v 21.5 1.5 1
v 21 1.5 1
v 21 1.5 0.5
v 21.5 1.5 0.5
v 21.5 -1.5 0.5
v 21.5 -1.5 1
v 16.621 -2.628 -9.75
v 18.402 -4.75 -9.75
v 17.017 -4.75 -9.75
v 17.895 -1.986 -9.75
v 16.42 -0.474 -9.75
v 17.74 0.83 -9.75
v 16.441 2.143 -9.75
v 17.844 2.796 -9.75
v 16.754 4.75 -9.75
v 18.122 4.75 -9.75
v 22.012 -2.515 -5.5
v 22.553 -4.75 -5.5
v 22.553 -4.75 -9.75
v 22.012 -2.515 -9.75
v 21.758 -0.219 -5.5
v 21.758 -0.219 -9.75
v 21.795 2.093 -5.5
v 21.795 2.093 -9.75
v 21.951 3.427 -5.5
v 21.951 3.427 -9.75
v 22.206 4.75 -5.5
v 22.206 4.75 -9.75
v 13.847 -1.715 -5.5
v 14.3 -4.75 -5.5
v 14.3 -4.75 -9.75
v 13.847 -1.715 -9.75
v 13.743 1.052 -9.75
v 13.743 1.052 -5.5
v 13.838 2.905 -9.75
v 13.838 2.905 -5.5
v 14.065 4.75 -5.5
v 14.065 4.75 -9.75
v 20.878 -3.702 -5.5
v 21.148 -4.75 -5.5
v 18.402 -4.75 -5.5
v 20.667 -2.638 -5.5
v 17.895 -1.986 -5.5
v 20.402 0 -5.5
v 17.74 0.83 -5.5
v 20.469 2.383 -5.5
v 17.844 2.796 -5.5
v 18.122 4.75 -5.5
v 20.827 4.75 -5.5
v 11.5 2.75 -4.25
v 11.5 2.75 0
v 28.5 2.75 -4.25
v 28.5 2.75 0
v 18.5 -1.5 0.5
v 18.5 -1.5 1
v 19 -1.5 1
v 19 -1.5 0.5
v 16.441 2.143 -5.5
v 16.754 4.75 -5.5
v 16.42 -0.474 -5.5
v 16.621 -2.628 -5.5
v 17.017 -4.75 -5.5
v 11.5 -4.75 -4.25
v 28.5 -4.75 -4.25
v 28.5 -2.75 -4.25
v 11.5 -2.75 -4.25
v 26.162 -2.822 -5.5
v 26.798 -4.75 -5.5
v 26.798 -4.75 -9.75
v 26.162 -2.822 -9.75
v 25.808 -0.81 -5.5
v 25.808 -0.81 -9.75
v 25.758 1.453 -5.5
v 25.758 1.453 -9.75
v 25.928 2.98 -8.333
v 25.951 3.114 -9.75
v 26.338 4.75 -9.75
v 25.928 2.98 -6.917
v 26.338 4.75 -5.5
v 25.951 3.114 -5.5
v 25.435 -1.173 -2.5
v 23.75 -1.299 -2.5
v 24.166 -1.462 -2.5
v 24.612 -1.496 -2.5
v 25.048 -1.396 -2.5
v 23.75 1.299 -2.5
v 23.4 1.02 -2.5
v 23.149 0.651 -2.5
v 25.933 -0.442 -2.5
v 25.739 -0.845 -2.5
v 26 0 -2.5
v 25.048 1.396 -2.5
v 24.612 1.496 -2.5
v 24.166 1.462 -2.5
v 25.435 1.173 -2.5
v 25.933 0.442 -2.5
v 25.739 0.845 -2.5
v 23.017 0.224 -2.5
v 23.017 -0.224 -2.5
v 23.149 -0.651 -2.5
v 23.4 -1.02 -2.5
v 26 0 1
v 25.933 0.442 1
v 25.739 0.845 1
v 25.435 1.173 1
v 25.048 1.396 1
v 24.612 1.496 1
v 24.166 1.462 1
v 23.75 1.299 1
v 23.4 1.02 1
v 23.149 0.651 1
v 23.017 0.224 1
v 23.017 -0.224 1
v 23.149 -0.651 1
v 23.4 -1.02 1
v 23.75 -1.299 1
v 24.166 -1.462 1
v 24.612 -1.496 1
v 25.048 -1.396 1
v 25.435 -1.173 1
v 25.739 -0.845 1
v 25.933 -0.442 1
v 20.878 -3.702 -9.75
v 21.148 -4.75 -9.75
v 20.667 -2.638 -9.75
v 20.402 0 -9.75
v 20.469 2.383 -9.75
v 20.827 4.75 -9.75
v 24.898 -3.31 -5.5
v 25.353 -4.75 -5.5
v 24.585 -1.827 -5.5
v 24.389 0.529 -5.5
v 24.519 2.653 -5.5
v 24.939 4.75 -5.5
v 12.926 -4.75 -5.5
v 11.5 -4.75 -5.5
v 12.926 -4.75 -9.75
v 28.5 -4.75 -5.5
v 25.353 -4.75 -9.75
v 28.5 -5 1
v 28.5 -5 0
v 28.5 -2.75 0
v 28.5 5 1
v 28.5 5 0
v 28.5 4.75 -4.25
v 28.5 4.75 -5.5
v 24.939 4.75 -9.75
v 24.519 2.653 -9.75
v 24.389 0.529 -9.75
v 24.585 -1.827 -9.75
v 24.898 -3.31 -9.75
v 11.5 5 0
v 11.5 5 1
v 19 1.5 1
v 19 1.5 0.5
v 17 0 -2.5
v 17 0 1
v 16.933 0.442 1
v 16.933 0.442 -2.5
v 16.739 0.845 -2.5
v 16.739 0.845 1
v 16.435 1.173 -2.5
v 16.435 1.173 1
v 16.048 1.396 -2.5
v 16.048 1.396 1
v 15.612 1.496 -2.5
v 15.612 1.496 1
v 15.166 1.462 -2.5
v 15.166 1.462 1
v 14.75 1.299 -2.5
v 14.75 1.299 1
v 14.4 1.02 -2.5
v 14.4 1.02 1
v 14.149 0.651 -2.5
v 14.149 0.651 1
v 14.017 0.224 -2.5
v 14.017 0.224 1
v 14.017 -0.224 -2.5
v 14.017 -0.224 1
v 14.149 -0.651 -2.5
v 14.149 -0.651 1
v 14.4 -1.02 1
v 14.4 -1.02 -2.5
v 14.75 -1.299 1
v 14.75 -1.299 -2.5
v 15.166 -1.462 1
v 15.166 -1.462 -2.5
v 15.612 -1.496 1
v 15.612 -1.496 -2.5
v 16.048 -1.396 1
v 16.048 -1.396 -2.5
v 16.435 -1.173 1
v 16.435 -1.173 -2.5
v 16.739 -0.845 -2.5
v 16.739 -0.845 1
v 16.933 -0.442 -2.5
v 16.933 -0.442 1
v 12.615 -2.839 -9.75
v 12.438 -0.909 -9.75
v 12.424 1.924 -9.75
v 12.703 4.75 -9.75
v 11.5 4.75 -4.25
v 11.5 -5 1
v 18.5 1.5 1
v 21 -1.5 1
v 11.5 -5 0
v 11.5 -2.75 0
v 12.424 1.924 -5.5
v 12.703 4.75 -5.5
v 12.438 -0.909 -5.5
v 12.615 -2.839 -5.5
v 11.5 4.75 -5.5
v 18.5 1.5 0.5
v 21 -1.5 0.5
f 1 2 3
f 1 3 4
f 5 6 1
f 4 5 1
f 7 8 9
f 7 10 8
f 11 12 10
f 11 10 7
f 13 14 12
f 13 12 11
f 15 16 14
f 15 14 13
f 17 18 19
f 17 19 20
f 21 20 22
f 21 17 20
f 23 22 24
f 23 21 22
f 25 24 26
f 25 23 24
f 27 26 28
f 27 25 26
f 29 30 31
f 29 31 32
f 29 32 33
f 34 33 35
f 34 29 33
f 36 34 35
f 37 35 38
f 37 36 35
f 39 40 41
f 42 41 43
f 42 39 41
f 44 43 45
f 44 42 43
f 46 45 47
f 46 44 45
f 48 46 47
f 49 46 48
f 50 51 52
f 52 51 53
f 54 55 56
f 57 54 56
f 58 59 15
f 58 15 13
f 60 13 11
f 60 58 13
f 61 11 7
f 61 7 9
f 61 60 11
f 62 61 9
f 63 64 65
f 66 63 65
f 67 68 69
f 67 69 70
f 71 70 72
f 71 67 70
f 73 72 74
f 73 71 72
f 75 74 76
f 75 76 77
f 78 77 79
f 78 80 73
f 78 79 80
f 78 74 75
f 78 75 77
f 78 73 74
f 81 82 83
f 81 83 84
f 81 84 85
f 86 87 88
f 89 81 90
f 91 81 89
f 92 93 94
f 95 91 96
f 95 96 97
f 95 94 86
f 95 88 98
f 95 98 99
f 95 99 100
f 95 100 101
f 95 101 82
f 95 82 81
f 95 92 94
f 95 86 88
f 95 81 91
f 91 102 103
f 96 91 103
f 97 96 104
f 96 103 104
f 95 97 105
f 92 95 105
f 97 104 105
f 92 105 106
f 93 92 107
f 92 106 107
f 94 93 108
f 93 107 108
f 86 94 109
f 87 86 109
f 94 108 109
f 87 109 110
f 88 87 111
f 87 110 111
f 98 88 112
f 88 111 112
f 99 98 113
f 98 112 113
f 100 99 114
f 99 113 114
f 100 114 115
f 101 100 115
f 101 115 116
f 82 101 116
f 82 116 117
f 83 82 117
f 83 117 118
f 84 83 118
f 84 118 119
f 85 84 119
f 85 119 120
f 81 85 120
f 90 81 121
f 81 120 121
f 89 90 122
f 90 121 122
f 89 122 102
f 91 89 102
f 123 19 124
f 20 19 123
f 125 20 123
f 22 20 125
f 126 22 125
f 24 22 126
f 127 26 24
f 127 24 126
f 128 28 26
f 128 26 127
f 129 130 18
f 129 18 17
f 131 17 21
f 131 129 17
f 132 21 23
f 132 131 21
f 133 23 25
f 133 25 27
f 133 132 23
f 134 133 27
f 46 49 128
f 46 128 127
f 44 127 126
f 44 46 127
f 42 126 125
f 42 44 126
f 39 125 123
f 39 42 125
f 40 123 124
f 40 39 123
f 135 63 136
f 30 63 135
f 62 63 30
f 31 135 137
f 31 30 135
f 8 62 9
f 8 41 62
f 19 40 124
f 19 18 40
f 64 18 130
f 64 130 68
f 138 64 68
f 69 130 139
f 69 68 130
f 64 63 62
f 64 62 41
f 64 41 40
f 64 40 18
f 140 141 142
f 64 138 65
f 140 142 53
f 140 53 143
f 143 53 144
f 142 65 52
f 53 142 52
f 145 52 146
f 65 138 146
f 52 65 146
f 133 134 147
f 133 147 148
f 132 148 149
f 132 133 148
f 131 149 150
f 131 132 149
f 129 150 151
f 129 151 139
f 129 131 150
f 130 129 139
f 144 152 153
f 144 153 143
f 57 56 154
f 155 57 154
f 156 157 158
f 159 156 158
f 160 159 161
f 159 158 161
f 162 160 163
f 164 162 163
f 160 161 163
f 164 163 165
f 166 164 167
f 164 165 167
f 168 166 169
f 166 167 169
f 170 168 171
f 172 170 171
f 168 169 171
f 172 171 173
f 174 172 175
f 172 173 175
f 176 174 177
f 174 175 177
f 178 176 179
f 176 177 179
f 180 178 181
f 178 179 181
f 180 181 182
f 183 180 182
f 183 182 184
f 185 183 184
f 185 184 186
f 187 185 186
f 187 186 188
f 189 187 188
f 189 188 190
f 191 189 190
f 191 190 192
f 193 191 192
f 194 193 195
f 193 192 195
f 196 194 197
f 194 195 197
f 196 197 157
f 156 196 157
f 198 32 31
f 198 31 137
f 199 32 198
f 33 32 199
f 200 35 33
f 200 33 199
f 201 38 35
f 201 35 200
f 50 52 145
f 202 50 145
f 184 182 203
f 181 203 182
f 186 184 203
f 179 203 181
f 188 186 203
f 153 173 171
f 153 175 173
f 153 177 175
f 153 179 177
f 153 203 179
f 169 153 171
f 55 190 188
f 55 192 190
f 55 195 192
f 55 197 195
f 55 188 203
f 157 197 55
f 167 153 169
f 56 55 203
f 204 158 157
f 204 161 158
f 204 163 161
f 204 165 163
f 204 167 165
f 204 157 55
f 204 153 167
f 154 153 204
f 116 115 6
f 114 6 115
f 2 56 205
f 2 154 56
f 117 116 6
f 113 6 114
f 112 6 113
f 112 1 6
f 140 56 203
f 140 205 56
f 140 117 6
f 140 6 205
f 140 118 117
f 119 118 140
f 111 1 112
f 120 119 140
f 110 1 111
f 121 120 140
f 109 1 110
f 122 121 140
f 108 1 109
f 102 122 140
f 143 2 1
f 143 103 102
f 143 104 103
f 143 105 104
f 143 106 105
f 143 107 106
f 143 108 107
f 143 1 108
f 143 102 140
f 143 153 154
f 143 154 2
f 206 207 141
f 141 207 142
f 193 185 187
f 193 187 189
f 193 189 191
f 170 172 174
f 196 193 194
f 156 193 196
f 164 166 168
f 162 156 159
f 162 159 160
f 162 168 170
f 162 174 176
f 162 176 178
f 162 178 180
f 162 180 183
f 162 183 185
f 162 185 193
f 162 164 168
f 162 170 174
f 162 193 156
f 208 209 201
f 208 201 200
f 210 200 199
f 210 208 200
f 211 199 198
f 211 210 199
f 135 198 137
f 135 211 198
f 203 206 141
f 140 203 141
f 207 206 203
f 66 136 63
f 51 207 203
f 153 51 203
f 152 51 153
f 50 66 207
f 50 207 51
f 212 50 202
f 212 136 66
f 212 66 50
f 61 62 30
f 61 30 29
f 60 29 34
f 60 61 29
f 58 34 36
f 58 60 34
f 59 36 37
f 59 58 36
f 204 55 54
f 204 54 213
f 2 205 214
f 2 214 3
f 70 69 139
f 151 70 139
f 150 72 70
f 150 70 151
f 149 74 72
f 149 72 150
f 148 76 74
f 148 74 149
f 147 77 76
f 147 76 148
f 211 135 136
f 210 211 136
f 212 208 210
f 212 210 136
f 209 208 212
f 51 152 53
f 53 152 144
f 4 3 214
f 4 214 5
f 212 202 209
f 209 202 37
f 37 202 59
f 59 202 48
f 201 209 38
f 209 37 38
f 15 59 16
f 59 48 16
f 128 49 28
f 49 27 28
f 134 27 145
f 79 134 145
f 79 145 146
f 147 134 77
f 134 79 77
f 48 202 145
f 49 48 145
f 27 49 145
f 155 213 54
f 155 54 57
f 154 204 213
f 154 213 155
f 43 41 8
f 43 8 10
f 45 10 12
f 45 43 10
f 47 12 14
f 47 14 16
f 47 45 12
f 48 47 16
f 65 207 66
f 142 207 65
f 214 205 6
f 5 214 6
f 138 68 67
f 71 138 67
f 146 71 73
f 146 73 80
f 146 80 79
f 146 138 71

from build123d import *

# Parameters (mm, degrees)
ESQUISSE1_W             = 17
ESQUISSE1_H             = 5.5
BOSS_EXTRU_1_DEPTH      = 5.5
ESQUISSE2_W             = 1.25
ESQUISSE2_H             = 9.5
BOSS_EXTRU_2_DEPTH      = 17
ESQUISSE3_W             = 17
ESQUISSE3_H             = 10
BOSS_EXTRU_3_DEPTH      = 1
ESQUISSE4_R             = 1.5
ENL_V_MAT_EXTRU_1_DEPTH = 3.5
ESQUISSE5_W             = 0.5
ESQUISSE5_H             = 3
ENL_V_MAT_EXTRU_2_DEPTH = 0.5
BOSS_EXTRU_4_DEPTH      = 4.25


with BuildPart() as part:
    # Esquisse1 → Boss.-Extru.1 (new body)
    with BuildSketch(Plane.XY):
        with Locations((20, 0)):
            Rectangle(ESQUISSE1_W, ESQUISSE1_H)
    extrude(amount=-BOSS_EXTRU_1_DEPTH)

    # Esquisse2 → Boss.-Extru.2 (add)
    with BuildSketch(Plane(origin=(28.5, 0, 0), x_dir=(0, 0, -1), z_dir=(1, 0, 0))):
        with Locations((4.875, 0)):
            Rectangle(ESQUISSE2_W, ESQUISSE2_H)
    extrude(amount=-BOSS_EXTRU_2_DEPTH)

    # Esquisse3 → Boss.-Extru.3 (add)
    with BuildSketch(Plane.XY):
        with Locations((20, 0)):
            Rectangle(ESQUISSE3_W, ESQUISSE3_H)
    extrude(amount=BOSS_EXTRU_3_DEPTH)

    # Esquisse4 → Enlèv. mat.-Extru.1 (cut)
    with BuildSketch(Plane.XY.offset(1)):
        with Locations((24.5, 0)):
            Circle(ESQUISSE4_R)
        with Locations((15.5, 0)):
            Circle(ESQUISSE4_R)
    extrude(amount=-ENL_V_MAT_EXTRU_1_DEPTH, mode=Mode.SUBTRACT)

    # Esquisse5 → Enlèv. mat.-Extru.2 (cut)
    with BuildSketch(Plane.XY.offset(1)):
        with Locations((21.25, 0)):
            Rectangle(ESQUISSE5_W, ESQUISSE5_H)
        with Locations((18.75, 0)):
            Rectangle(ESQUISSE5_W, ESQUISSE5_H)
    extrude(amount=-ENL_V_MAT_EXTRU_2_DEPTH, mode=Mode.SUBTRACT)

    # Esquisse6 → Boss.-Extru.4 (add)
    with BuildSketch(Plane(origin=(0, 0, -5.5), x_dir=(-1, 0, 0), z_dir=(0, 0, -1))):
        with BuildLine():
            Line((-22.552794805, -4.75), (-21.148073426, -4.75))
            add(Edge.make_bspline(
                [(-20.826956456, 4.75), (-20.701976007, 4.166184335), (-20.247306857, 1.445543191), (-20.393909727, -1.7940686), (-21.021282717, -4.308854476), (-21.148073426, -4.75)],
                knots=[0.486029583, 0.486029583, 0.486029583, 0.486029583, 0.487632249, 0.493437395, 0.49468936, 0.49468936, 0.49468936, 0.49468936], degree=3))
            Line((-20.826956456, 4.75), (-22.205629087, 4.75))
            add(Edge.make_bspline(
                [(-22.552794805, -4.75), (-22.373592229, -4.173323429), (-21.728969731, -1.663462019), (-21.607804021, 1.583807787), (-22.070035816, 4.161706415), (-22.205629087, 4.75)],
                knots=[0.248115269, 0.248115269, 0.248115269, 0.248115269, 0.249885808, 0.255690519, 0.257428263, 0.257428263, 0.257428263, 0.257428263], degree=3))
        make_face()
        with BuildLine():
            Line((-24.938721269, 4.75), (-26.33817718, 4.75))
            add(Edge.make_bspline(
                [(-26.797581514, -4.75), (-26.395153508, -3.772148074), (-25.672927447, -1.249795135), (-25.669056389, 2.034035882), (-26.163928672, 4.16779276), (-26.33817718, 4.75)],
                knots=[0.135603088, 0.135603088, 0.135603088, 0.135603088, 0.139596288, 0.145400999, 0.147627485, 0.147627485, 0.147627485, 0.147627485], degree=3))
            Line((-26.797581514, -4.75), (-25.352622939, -4.75))
            add(Edge.make_bspline(
                [(-24.938721269, 4.75), (-24.790737954, 4.205700458), (-24.308623009, 1.965116283), (-24.333265983, -1.304768064), (-25.024589159, -3.86460469), (-25.352622939, -4.75)],
                knots=[0.596036757, 0.596036757, 0.596036757, 0.596036757, 0.597930019, 0.603735165, 0.606985384, 0.606985384, 0.606985384, 0.606985384], degree=3))
        make_face()
        with BuildLine():
            Line((-18.401930877, -4.75), (-17.0169294, -4.75))
            add(Edge.make_bspline(
                [(-16.754018342, 4.75), (-16.622548676, 4.006332525), (-16.215434289, 0.825617368), (-16.46223045, -2.389104753), (-17.0169294, -4.75)],
                knots=[0.375646512, 0.375646512, 0.375646512, 0.375646512, 0.377334478, 0.382815018, 0.382815018, 0.382815018, 0.382815018], degree=3))
            Line((-16.754018342, 4.75), (-18.122057744, 4.75))
            add(Edge.make_bspline(
                [(-18.401930877, -4.75), (-18.393480034, -4.716238825), (-17.802884316, -2.332718806), (-17.554252699, 0.889694687), (-17.988042673, 4.036223412), (-18.122057744, 4.75)],
                knots=[0.360091869, 0.360091869, 0.360091869, 0.360091869, 0.360175327, 0.365980039, 0.367700208, 0.367700208, 0.367700208, 0.367700208], degree=3))
        make_face()
        with BuildLine():
            Line((-12.702642178, 4.75), (-14.064547598, 4.75))
            add(Edge.make_bspline(
                [(-14.300001857, -4.75), (-13.846890026, -2.590707185), (-13.586316634, 0.605300957), (-13.912106186, 3.788517123), (-14.064547598, 4.75)],
                knots=[0.471792726, 0.471792726, 0.471792726, 0.471792726, 0.476269559, 0.478227562, 0.478227562, 0.478227562, 0.478227562], degree=3))
            Line((-14.300001857, -4.75), (-12.926181075, -4.75))
            add(Edge.make_bspline(
                [(-12.702642178, 4.75), (-12.548150742, 3.724600153), (-12.249496767, 0.541531469), (-12.507778318, -2.649137977), (-12.926181075, -4.75)],
                knots=[0.265051802, 0.265051802, 0.265051802, 0.265051802, 0.267036708, 0.271169831, 0.271169831, 0.271169831, 0.271169831], degree=3))
        make_face()
    extrude(amount=BOSS_EXTRU_4_DEPTH)


solid = part.part
